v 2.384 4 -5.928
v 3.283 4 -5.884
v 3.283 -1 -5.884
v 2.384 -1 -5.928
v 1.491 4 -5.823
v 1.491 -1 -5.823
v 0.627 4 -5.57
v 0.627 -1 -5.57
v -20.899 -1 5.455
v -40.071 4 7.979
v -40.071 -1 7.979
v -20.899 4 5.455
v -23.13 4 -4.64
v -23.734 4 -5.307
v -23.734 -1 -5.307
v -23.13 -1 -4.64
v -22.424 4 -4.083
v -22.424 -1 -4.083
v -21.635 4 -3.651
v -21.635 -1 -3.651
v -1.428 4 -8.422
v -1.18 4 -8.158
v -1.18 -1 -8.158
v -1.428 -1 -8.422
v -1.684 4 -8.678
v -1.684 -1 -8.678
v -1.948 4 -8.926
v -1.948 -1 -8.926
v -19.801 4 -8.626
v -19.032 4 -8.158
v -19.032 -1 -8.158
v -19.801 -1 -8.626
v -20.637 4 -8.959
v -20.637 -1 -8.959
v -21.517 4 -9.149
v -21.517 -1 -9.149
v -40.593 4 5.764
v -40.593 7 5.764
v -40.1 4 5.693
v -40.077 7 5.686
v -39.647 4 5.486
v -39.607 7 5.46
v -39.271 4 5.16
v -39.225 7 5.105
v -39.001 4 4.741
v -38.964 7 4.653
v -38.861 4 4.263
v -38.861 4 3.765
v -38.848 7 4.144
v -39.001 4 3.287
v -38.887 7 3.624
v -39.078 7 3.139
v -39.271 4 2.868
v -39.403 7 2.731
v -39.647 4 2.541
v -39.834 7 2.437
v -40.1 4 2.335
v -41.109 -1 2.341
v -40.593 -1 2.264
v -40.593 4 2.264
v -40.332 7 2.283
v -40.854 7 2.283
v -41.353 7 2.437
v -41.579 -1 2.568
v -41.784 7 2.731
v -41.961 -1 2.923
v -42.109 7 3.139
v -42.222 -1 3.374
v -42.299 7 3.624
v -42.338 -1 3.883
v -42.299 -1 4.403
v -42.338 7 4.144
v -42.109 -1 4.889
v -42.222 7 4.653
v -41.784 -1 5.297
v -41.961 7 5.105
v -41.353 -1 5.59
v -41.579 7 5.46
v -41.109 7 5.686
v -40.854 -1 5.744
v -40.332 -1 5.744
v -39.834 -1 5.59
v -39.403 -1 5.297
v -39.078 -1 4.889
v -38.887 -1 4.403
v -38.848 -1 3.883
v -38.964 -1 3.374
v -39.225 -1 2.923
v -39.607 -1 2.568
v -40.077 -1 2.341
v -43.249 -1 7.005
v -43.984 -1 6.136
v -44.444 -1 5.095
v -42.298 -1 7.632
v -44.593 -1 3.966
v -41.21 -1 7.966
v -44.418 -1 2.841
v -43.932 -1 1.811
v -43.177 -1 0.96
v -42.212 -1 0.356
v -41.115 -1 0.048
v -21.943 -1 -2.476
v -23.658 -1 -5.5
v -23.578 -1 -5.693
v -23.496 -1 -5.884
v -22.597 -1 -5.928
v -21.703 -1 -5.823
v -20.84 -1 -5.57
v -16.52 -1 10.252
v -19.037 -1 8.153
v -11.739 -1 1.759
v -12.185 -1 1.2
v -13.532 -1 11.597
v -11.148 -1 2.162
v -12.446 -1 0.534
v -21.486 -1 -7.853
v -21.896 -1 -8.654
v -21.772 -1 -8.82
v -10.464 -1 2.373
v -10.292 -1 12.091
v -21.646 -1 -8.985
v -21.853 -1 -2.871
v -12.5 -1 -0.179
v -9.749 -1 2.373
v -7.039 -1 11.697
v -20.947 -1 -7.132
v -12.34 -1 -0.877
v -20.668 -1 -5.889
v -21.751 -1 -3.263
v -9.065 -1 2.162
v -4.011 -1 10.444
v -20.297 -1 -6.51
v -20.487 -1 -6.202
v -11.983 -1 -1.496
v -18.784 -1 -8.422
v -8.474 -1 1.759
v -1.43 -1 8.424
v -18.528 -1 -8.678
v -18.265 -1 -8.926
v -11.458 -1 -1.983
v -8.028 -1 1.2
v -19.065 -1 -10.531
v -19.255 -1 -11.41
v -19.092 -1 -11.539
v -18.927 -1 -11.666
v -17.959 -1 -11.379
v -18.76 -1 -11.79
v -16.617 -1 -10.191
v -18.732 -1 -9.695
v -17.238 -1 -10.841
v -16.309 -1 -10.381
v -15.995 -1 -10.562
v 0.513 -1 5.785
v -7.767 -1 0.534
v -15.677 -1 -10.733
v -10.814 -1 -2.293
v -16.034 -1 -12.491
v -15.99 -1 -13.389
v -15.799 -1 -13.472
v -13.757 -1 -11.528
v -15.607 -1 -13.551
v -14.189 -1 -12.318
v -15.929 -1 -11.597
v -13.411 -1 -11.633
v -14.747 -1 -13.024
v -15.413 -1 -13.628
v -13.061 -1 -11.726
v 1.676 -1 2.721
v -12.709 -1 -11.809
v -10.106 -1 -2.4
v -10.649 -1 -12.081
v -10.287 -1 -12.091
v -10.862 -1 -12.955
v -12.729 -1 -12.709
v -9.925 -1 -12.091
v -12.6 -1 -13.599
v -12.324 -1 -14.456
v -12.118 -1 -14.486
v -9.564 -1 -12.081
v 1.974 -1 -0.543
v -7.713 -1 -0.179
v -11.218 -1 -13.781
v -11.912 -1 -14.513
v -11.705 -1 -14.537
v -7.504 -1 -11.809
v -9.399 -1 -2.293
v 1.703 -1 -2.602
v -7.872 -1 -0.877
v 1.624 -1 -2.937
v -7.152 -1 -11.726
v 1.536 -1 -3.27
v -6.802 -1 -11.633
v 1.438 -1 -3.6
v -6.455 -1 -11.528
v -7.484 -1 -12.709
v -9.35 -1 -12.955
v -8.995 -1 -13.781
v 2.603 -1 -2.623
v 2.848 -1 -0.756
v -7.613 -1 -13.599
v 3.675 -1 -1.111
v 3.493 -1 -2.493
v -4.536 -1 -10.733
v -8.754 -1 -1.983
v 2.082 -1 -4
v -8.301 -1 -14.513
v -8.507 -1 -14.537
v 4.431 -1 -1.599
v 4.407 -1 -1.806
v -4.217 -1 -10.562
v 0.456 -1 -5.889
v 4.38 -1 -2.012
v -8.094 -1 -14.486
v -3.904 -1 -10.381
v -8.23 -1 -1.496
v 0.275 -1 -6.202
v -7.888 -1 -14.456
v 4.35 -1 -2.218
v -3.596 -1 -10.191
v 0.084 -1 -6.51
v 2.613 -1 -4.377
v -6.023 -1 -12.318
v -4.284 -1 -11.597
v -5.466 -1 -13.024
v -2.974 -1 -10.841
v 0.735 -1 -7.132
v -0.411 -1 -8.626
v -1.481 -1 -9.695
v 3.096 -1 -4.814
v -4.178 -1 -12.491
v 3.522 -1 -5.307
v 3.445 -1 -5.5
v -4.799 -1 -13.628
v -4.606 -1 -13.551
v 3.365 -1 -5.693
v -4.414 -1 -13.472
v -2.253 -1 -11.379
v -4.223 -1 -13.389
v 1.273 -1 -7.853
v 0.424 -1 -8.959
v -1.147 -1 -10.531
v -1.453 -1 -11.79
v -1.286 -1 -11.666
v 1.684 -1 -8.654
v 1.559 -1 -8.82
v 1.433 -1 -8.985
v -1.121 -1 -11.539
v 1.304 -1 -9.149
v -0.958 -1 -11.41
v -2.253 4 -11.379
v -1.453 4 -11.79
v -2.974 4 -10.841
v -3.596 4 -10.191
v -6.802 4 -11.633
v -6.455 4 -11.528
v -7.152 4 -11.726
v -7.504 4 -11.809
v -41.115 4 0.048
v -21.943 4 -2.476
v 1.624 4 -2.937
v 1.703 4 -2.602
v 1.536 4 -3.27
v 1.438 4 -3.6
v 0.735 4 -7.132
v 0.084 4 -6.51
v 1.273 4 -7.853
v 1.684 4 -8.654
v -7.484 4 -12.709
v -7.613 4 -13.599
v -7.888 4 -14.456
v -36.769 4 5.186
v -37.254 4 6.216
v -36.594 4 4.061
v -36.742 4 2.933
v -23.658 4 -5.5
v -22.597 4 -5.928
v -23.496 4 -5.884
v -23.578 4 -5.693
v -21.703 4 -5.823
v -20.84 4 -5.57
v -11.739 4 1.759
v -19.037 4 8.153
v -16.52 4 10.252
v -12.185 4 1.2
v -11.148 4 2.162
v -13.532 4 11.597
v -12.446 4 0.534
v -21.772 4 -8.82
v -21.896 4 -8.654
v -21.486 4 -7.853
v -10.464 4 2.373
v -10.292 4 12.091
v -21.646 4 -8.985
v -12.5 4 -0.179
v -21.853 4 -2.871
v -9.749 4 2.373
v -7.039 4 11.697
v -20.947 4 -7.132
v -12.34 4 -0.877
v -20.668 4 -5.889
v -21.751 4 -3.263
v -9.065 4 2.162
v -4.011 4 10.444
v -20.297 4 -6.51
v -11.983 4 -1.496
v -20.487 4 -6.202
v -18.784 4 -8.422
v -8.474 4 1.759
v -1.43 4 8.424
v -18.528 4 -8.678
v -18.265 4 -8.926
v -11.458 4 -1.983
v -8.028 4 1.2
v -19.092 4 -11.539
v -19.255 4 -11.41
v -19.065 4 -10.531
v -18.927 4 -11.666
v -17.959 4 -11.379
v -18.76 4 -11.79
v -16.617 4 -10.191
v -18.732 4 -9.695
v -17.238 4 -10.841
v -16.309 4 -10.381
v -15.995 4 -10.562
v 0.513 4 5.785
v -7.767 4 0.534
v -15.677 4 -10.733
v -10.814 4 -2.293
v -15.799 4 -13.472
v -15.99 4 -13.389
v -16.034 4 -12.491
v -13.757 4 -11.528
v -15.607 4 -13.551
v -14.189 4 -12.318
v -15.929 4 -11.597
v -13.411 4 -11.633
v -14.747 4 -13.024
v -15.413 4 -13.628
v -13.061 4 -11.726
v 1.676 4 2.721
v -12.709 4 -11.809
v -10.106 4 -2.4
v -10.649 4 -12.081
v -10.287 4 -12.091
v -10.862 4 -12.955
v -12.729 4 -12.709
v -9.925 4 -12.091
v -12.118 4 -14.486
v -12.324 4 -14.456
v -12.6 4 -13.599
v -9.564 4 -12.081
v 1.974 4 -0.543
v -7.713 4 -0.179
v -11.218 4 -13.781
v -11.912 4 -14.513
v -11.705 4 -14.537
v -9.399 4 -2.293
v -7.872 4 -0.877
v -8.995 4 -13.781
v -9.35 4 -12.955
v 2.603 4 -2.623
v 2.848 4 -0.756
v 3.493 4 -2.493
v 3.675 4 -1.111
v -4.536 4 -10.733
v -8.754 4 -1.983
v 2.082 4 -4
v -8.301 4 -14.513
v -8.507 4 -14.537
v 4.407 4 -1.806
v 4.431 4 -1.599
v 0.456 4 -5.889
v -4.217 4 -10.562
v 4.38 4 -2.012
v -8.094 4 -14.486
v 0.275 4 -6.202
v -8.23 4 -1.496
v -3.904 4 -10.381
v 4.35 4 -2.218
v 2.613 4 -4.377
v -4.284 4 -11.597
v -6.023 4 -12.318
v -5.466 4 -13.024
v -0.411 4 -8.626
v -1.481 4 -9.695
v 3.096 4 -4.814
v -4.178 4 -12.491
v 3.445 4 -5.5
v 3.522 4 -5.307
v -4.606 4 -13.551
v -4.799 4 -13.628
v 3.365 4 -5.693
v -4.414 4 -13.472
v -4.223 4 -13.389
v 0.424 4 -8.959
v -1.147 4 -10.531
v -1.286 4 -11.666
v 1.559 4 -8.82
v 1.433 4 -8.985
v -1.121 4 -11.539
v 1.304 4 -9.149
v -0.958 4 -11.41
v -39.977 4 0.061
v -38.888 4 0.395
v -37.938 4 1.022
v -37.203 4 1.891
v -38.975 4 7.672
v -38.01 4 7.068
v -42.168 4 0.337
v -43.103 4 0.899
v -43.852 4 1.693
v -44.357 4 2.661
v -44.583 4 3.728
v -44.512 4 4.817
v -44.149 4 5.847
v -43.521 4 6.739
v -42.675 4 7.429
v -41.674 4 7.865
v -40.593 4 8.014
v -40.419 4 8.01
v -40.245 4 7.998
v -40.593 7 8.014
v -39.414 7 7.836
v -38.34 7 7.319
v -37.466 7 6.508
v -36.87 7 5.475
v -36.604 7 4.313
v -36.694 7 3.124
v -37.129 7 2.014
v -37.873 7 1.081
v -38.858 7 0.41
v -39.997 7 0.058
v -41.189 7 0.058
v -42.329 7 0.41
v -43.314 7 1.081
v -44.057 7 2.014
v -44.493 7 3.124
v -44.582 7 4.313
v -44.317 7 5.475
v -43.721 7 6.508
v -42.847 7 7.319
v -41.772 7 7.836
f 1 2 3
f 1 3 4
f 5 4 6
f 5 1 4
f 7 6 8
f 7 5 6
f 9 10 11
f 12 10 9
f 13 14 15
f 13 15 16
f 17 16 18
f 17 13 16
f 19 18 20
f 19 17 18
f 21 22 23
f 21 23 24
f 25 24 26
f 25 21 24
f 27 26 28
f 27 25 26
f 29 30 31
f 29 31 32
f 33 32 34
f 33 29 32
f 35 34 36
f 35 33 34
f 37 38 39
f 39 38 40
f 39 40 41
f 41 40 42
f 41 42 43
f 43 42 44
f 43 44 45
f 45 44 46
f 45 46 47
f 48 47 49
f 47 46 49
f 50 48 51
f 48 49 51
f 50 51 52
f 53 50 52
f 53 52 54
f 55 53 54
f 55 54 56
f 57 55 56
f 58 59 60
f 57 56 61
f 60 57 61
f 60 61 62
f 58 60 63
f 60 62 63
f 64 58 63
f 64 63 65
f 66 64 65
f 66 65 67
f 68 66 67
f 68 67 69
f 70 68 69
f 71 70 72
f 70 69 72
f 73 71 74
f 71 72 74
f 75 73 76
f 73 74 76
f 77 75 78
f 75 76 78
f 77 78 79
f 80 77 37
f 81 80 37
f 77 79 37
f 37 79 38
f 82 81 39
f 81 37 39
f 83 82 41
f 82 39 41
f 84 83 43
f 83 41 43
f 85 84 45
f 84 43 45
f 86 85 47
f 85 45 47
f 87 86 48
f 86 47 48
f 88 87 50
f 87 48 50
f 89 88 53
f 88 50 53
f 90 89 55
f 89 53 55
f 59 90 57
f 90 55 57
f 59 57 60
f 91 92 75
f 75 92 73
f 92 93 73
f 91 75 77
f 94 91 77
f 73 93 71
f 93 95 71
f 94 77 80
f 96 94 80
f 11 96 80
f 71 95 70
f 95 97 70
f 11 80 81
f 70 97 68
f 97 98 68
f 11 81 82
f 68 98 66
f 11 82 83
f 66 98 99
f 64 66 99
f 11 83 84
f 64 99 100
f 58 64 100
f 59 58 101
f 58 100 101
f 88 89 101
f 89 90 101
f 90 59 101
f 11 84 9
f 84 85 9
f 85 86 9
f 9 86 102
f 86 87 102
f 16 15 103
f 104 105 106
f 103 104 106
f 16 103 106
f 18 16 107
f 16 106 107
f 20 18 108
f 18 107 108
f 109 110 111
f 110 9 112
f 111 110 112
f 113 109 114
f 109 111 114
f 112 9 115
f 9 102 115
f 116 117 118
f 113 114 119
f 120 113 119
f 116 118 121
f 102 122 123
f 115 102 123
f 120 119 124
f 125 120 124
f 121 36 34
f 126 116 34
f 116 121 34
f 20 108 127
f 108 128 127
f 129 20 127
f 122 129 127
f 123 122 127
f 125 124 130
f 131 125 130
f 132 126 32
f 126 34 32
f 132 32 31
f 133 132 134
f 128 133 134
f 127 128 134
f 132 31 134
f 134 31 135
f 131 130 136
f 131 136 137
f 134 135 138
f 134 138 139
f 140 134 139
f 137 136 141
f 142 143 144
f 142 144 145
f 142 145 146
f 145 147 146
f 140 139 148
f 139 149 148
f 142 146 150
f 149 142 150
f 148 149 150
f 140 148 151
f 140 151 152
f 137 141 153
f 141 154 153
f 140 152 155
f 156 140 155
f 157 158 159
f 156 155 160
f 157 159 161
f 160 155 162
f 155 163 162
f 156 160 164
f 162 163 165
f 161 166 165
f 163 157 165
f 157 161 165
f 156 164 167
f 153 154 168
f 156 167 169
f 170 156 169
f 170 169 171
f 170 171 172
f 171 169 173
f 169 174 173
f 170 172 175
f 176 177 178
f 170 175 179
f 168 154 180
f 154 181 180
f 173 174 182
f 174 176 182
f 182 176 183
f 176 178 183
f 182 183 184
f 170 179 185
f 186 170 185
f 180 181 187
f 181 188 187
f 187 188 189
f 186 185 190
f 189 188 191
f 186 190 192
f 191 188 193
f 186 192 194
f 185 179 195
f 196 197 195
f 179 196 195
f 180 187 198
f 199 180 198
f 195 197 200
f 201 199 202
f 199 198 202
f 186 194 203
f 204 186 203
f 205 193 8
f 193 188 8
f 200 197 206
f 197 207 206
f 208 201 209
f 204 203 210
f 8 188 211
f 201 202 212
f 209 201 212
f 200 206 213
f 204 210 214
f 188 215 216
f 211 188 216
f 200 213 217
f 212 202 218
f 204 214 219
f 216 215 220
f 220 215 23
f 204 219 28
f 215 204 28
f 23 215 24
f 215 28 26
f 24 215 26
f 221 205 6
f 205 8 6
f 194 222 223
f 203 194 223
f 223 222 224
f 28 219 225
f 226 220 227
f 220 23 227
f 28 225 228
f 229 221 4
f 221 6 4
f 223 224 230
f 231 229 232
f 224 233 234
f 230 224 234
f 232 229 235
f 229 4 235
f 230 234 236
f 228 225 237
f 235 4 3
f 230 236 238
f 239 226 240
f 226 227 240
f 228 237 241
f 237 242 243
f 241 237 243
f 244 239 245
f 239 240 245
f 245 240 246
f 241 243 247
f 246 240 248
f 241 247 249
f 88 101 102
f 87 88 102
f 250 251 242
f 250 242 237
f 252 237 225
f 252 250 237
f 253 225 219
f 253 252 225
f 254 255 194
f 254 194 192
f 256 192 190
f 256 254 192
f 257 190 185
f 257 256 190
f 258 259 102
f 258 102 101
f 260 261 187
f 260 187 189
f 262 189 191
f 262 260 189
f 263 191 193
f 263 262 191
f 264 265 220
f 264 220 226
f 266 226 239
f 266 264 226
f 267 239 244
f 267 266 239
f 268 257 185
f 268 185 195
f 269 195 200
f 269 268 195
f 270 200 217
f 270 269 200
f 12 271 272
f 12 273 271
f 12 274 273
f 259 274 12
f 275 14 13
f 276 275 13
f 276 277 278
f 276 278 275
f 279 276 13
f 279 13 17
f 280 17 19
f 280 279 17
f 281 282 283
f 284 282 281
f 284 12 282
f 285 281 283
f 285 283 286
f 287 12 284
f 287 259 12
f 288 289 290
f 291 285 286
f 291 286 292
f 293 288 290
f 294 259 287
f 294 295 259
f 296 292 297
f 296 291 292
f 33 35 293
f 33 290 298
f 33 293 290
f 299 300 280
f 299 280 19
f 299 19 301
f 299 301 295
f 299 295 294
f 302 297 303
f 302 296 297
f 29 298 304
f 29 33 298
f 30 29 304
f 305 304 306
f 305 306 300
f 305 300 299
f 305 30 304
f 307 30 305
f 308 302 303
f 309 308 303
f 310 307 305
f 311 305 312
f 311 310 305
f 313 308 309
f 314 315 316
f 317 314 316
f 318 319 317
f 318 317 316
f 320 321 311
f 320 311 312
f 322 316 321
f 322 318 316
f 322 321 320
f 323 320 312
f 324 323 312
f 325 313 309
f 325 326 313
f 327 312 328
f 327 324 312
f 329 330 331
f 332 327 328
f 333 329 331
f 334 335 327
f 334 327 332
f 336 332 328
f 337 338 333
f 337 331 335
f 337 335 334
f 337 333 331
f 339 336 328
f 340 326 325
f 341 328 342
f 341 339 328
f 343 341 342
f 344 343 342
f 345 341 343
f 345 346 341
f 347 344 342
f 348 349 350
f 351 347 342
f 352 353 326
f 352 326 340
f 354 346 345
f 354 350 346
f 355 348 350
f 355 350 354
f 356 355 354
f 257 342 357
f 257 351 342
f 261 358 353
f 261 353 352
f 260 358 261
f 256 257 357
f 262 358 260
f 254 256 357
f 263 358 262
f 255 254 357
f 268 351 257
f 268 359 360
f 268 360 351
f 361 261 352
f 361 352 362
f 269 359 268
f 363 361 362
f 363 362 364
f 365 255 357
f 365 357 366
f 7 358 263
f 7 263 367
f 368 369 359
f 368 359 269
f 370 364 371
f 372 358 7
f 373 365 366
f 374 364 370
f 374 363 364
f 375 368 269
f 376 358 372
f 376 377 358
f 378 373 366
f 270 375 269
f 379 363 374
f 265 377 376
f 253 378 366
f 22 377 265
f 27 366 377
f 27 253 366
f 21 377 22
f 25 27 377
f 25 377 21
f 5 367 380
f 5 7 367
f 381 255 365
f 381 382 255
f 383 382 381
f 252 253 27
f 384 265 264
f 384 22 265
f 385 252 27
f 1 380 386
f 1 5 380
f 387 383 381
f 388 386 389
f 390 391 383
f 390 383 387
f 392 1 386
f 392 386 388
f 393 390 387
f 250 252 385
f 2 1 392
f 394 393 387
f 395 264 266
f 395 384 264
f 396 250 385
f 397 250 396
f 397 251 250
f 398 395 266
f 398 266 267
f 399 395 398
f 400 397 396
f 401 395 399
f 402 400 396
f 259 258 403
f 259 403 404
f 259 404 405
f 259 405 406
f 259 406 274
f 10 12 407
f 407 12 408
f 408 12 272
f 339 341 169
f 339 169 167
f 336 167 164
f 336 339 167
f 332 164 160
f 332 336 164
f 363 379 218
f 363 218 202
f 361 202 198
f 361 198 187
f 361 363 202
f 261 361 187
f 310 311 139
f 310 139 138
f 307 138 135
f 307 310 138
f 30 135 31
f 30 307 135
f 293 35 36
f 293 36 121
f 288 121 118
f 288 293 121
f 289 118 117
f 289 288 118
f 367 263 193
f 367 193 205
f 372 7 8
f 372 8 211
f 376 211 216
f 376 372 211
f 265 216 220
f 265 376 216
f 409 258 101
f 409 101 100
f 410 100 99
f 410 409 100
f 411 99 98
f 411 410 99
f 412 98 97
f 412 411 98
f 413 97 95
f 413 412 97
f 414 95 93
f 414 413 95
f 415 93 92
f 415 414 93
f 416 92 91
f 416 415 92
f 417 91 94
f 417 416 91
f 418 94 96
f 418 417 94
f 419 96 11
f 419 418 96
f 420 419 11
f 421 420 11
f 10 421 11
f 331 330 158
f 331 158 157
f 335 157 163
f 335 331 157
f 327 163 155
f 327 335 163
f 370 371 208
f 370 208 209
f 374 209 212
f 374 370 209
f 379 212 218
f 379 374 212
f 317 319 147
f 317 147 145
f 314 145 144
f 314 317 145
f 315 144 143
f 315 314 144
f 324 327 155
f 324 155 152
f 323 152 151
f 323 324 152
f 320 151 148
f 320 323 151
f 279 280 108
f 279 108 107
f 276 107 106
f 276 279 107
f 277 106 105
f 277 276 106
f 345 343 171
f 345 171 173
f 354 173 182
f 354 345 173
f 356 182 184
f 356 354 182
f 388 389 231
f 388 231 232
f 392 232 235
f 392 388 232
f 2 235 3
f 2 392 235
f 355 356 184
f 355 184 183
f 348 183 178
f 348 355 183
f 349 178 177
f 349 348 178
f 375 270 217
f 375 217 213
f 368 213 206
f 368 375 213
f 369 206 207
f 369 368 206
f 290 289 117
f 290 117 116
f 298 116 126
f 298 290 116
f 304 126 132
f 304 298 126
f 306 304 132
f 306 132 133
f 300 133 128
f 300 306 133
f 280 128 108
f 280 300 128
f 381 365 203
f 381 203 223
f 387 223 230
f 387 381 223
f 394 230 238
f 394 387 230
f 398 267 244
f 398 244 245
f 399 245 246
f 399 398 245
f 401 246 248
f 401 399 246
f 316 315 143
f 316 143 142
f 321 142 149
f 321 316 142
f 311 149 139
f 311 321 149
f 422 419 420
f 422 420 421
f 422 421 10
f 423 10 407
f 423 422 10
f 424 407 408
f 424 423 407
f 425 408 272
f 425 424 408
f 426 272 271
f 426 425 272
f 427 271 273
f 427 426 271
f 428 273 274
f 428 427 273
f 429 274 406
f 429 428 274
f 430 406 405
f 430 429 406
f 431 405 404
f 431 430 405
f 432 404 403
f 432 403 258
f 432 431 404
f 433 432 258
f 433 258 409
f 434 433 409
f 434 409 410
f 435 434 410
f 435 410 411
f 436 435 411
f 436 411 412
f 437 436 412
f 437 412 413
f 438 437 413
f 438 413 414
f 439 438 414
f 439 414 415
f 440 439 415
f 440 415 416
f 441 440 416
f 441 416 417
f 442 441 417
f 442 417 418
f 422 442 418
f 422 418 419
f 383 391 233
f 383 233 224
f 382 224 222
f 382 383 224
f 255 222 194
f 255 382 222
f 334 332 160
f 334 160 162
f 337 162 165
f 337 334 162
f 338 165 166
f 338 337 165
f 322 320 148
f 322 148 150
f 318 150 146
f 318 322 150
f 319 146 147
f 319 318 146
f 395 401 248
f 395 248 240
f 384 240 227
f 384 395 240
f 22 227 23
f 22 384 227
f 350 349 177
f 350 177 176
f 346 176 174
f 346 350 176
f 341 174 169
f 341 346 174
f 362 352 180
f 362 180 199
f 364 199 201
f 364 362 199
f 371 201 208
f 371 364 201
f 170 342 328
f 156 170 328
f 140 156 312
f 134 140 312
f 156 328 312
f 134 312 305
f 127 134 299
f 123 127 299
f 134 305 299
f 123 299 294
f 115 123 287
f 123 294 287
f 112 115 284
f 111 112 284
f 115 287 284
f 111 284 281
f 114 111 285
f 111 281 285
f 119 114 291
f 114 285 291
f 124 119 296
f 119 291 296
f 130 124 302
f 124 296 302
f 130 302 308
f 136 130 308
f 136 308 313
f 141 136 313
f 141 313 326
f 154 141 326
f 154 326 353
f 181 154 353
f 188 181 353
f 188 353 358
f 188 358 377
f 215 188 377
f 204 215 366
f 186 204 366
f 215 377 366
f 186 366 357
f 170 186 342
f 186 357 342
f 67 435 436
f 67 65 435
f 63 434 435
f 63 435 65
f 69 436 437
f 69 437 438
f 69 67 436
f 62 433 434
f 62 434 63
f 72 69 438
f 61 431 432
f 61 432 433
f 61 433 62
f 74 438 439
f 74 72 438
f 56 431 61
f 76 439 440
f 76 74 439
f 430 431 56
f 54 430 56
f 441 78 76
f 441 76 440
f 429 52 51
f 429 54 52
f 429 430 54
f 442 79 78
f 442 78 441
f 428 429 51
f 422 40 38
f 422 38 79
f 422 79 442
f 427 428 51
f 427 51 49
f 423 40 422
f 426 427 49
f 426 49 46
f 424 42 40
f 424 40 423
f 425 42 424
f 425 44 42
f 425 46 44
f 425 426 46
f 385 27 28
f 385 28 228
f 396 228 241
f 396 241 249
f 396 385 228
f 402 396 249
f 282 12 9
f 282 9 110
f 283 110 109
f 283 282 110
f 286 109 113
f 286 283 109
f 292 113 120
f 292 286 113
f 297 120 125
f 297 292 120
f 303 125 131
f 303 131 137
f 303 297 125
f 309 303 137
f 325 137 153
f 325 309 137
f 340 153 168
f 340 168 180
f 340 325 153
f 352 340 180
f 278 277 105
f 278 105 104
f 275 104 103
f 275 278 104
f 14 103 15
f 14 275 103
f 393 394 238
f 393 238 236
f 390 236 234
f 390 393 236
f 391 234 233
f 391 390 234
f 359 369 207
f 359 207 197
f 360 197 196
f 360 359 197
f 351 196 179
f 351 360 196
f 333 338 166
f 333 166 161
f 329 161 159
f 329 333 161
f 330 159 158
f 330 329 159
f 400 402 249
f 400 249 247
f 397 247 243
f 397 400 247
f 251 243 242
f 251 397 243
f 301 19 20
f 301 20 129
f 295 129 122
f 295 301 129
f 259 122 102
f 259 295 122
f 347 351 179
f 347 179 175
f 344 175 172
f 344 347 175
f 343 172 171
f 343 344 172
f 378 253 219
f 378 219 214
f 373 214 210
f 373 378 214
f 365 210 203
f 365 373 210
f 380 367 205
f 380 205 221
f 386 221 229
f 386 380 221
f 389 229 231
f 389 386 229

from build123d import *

# Parameters (mm, degrees)
SKETCH1_R           = 1.75
SKETCH1_R_2         = 2.4
BOSS_EXTRUDE1_DEPTH = 5
EXTRUDE_START       = 3
SKETCH_1_R          = 4
SKETCH_1_R_2        = 1.75
EXTRUDE_1_DEPTH     = 3


with BuildPart() as part:
    # Sketch1 → Boss-Extrude1 (new body)
    with BuildSketch(Plane(origin=(0, 4, 0), x_dir=(1, 0, 0), z_dir=(0, 1, 0))):
        with BuildLine():
            Line((1.43808022, 3.600125745), (2.081641936, 4))
            ThreePointArc((2.081641936, 4), (2.861028333, 4.588201733), (3.521749436, 5.30713988))
            ThreePointArc((3.521749436, 5.30713988), (3.405395609, 5.596745198), (3.282888305, 5.883801663))
            ThreePointArc((3.282888305, 5.883801663), (1.93527598, 5.894040025), (0.627094961, 5.57027124))
            ThreePointArc((0.627094961, 5.57027124), (0.366286148, 6.046375), (0.084372603, 6.510293938))
            ThreePointArc((0.084372603, 6.510293938), (1.018855105, 7.48132754), (1.683794586, 8.65351323))
            ThreePointArc((1.683794586, 8.65351323), (1.496450048, 8.903135899), (1.303821399, 9.148703928))
            ThreePointArc((1.303821399, 9.148703928), (-0.000522033, 8.809805691), (-1.180330337, 8.158486898))
            ThreePointArc((-1.180330337, 8.158486898), (-1.555477026, 8.550865528), (-1.947855656, 8.926012217))
            ThreePointArc((-1.947855656, 8.926012217), (-1.296536862, 10.105820521), (-0.957638625, 11.410163953))
            ThreePointArc((-0.957638625, 11.410163953), (-1.203206655, 11.602792602), (-1.452829324, 11.79013714))
            ThreePointArc((-1.452829324, 11.79013714), (-2.625015014, 11.125197659), (-3.596048616, 10.190715157))
            ThreePointArc((-3.596048616, 10.190715157), (-4.059967554, 10.472628702), (-4.536071314, 10.733437515))
            ThreePointArc((-4.536071314, 10.733437515), (-4.212302529, 12.041618533), (-4.222540891, 13.389230859))
            ThreePointArc((-4.222540891, 13.389230859), (-4.509597355, 13.511738163), (-4.799202674, 13.62809199))
            ThreePointArc((-4.799202674, 13.62809199), (-5.759348103, 12.682425791), (-6.455432668, 11.528463019))
            ThreePointArc((-6.455432668, 11.528463019), (-6.976508546, 11.680699536), (-7.503891752, 11.809396783))
            ThreePointArc((-7.503891752, 11.809396783), (-7.529737283, 13.156800143), (-7.888414517, 14.455843809))
            ThreePointArc((-7.888414517, 14.455843809), (-8.197396993, 14.499881098), (-8.507248835, 14.537314892))
            ThreePointArc((-8.507248835, 14.537314892), (-9.18992168, 13.375367565), (-9.563620196, 12.080565177))
            ThreePointArc((-9.563620196, 12.080565177), (-10.106342554, 12.09275), (-10.649064912, 12.080565177))
            ThreePointArc((-10.649064912, 12.080565177), (-11.022763428, 13.375367565), (-11.705436272, 14.537314892))
            ThreePointArc((-11.705436272, 14.537314892), (-12.015288115, 14.499881098), (-12.324270591, 14.455843809))
            ThreePointArc((-12.324270591, 14.455843809), (-12.682947825, 13.156800143), (-12.708793355, 11.809396783))
            ThreePointArc((-12.708793355, 11.809396783), (-13.236176561, 11.680699536), (-13.757252439, 11.528463019))
            ThreePointArc((-13.757252439, 11.528463019), (-14.453337005, 12.682425791), (-15.413482434, 13.62809199))
            ThreePointArc((-15.413482434, 13.62809199), (-15.703087752, 13.511738163), (-15.990144217, 13.389230859))
            ThreePointArc((-15.990144217, 13.389230859), (-16.000382579, 12.041618533), (-15.676613793, 10.733437515))
            ThreePointArc((-15.676613793, 10.733437515), (-16.152717554, 10.472628702), (-16.616636492, 10.190715157))
            ThreePointArc((-16.616636492, 10.190715157), (-17.587670094, 11.125197659), (-18.759855783, 11.79013714))
            ThreePointArc((-18.759855783, 11.79013714), (-19.009478453, 11.602792602), (-19.255046482, 11.410163953))
            ThreePointArc((-19.255046482, 11.410163953), (-18.916148245, 10.105820521), (-18.264829452, 8.926012217))
            ThreePointArc((-18.264829452, 8.926012217), (-18.657208082, 8.550865528), (-19.032354771, 8.158486898))
            ThreePointArc((-19.032354771, 8.158486898), (-20.212163074, 8.809805691), (-21.516506507, 9.148703928))
            ThreePointArc((-21.516506507, 9.148703928), (-21.709135156, 8.903135899), (-21.896479694, 8.65351323))
            ThreePointArc((-21.896479694, 8.65351323), (-21.231540213, 7.48132754), (-20.297057711, 6.510293938))
            ThreePointArc((-20.297057711, 6.510293938), (-20.578971255, 6.046375), (-20.839780068, 5.57027124))
            ThreePointArc((-20.839780068, 5.57027124), (-22.147961087, 5.894040025), (-23.495573413, 5.883801663))
            ThreePointArc((-23.495573413, 5.883801663), (-23.618080717, 5.596745198), (-23.734434544, 5.30713988))
            ThreePointArc((-23.734434544, 5.30713988), (-22.788768345, 4.346994451), (-21.634805572, 3.650909885))
            ThreePointArc((-21.634805572, 3.650909885), (-21.803584999, 3.067429176), (-21.942853375, 2.47620963))
            Line((-21.942853375, 2.47620963), (-41.11537681, -0.047900965))
            ThreePointArc((-41.11537681, -0.047900965), (-44.559051487, -4.53578518), (-40.071167272, -7.979459856))
            Line((-40.071167272, -7.979459856), (-20.898643838, -5.455349261))
            ThreePointArc((-20.898643838, -5.455349261), (-7.038913378, -11.697242445), (1.974222624, 0.542722358))
            ThreePointArc((1.974222624, 0.542722358), (3.269025011, 0.916420874), (4.430972339, 1.599093719))
            ThreePointArc((4.430972339, 1.599093719), (4.393538544, 1.908945561), (4.349501255, 2.217928037))
            ThreePointArc((4.349501255, 2.217928037), (3.050457589, 2.576605271), (1.70305423, 2.602450802))
            ThreePointArc((1.70305423, 2.602450802), (1.581217534, 3.104116905), (1.43808022, 3.600125745))
        make_face()
        with Locations(Location((-40.593272041, -4.013680411, 0), (0, 0, 90))):
            Circle(SKETCH1_R, mode=Mode.SUBTRACT)
        with Locations(Location((-10.106342554, 0, 0), (0, 0, 90))):
            Circle(SKETCH1_R_2, mode=Mode.SUBTRACT)
    extrude(amount=-BOSS_EXTRUDE1_DEPTH)

    # 草图1 → 凸台-拉伸1 (add)
    with BuildSketch(Plane(origin=(0, 4, 0), x_dir=(1, 0, 0), z_dir=(0, 1, 0)).offset(EXTRUDE_START)):
        with Locations(Location((-40.593272041, -4.013680411, 0), (0, 0, 270))):
            Circle(SKETCH_1_R)
        with Locations(Location((-40.593272041, -4.013680411, 0), (0, 0, 270))):
            Circle(SKETCH_1_R_2, mode=Mode.SUBTRACT)
    extrude(amount=-EXTRUDE_1_DEPTH)


solid = part.part
